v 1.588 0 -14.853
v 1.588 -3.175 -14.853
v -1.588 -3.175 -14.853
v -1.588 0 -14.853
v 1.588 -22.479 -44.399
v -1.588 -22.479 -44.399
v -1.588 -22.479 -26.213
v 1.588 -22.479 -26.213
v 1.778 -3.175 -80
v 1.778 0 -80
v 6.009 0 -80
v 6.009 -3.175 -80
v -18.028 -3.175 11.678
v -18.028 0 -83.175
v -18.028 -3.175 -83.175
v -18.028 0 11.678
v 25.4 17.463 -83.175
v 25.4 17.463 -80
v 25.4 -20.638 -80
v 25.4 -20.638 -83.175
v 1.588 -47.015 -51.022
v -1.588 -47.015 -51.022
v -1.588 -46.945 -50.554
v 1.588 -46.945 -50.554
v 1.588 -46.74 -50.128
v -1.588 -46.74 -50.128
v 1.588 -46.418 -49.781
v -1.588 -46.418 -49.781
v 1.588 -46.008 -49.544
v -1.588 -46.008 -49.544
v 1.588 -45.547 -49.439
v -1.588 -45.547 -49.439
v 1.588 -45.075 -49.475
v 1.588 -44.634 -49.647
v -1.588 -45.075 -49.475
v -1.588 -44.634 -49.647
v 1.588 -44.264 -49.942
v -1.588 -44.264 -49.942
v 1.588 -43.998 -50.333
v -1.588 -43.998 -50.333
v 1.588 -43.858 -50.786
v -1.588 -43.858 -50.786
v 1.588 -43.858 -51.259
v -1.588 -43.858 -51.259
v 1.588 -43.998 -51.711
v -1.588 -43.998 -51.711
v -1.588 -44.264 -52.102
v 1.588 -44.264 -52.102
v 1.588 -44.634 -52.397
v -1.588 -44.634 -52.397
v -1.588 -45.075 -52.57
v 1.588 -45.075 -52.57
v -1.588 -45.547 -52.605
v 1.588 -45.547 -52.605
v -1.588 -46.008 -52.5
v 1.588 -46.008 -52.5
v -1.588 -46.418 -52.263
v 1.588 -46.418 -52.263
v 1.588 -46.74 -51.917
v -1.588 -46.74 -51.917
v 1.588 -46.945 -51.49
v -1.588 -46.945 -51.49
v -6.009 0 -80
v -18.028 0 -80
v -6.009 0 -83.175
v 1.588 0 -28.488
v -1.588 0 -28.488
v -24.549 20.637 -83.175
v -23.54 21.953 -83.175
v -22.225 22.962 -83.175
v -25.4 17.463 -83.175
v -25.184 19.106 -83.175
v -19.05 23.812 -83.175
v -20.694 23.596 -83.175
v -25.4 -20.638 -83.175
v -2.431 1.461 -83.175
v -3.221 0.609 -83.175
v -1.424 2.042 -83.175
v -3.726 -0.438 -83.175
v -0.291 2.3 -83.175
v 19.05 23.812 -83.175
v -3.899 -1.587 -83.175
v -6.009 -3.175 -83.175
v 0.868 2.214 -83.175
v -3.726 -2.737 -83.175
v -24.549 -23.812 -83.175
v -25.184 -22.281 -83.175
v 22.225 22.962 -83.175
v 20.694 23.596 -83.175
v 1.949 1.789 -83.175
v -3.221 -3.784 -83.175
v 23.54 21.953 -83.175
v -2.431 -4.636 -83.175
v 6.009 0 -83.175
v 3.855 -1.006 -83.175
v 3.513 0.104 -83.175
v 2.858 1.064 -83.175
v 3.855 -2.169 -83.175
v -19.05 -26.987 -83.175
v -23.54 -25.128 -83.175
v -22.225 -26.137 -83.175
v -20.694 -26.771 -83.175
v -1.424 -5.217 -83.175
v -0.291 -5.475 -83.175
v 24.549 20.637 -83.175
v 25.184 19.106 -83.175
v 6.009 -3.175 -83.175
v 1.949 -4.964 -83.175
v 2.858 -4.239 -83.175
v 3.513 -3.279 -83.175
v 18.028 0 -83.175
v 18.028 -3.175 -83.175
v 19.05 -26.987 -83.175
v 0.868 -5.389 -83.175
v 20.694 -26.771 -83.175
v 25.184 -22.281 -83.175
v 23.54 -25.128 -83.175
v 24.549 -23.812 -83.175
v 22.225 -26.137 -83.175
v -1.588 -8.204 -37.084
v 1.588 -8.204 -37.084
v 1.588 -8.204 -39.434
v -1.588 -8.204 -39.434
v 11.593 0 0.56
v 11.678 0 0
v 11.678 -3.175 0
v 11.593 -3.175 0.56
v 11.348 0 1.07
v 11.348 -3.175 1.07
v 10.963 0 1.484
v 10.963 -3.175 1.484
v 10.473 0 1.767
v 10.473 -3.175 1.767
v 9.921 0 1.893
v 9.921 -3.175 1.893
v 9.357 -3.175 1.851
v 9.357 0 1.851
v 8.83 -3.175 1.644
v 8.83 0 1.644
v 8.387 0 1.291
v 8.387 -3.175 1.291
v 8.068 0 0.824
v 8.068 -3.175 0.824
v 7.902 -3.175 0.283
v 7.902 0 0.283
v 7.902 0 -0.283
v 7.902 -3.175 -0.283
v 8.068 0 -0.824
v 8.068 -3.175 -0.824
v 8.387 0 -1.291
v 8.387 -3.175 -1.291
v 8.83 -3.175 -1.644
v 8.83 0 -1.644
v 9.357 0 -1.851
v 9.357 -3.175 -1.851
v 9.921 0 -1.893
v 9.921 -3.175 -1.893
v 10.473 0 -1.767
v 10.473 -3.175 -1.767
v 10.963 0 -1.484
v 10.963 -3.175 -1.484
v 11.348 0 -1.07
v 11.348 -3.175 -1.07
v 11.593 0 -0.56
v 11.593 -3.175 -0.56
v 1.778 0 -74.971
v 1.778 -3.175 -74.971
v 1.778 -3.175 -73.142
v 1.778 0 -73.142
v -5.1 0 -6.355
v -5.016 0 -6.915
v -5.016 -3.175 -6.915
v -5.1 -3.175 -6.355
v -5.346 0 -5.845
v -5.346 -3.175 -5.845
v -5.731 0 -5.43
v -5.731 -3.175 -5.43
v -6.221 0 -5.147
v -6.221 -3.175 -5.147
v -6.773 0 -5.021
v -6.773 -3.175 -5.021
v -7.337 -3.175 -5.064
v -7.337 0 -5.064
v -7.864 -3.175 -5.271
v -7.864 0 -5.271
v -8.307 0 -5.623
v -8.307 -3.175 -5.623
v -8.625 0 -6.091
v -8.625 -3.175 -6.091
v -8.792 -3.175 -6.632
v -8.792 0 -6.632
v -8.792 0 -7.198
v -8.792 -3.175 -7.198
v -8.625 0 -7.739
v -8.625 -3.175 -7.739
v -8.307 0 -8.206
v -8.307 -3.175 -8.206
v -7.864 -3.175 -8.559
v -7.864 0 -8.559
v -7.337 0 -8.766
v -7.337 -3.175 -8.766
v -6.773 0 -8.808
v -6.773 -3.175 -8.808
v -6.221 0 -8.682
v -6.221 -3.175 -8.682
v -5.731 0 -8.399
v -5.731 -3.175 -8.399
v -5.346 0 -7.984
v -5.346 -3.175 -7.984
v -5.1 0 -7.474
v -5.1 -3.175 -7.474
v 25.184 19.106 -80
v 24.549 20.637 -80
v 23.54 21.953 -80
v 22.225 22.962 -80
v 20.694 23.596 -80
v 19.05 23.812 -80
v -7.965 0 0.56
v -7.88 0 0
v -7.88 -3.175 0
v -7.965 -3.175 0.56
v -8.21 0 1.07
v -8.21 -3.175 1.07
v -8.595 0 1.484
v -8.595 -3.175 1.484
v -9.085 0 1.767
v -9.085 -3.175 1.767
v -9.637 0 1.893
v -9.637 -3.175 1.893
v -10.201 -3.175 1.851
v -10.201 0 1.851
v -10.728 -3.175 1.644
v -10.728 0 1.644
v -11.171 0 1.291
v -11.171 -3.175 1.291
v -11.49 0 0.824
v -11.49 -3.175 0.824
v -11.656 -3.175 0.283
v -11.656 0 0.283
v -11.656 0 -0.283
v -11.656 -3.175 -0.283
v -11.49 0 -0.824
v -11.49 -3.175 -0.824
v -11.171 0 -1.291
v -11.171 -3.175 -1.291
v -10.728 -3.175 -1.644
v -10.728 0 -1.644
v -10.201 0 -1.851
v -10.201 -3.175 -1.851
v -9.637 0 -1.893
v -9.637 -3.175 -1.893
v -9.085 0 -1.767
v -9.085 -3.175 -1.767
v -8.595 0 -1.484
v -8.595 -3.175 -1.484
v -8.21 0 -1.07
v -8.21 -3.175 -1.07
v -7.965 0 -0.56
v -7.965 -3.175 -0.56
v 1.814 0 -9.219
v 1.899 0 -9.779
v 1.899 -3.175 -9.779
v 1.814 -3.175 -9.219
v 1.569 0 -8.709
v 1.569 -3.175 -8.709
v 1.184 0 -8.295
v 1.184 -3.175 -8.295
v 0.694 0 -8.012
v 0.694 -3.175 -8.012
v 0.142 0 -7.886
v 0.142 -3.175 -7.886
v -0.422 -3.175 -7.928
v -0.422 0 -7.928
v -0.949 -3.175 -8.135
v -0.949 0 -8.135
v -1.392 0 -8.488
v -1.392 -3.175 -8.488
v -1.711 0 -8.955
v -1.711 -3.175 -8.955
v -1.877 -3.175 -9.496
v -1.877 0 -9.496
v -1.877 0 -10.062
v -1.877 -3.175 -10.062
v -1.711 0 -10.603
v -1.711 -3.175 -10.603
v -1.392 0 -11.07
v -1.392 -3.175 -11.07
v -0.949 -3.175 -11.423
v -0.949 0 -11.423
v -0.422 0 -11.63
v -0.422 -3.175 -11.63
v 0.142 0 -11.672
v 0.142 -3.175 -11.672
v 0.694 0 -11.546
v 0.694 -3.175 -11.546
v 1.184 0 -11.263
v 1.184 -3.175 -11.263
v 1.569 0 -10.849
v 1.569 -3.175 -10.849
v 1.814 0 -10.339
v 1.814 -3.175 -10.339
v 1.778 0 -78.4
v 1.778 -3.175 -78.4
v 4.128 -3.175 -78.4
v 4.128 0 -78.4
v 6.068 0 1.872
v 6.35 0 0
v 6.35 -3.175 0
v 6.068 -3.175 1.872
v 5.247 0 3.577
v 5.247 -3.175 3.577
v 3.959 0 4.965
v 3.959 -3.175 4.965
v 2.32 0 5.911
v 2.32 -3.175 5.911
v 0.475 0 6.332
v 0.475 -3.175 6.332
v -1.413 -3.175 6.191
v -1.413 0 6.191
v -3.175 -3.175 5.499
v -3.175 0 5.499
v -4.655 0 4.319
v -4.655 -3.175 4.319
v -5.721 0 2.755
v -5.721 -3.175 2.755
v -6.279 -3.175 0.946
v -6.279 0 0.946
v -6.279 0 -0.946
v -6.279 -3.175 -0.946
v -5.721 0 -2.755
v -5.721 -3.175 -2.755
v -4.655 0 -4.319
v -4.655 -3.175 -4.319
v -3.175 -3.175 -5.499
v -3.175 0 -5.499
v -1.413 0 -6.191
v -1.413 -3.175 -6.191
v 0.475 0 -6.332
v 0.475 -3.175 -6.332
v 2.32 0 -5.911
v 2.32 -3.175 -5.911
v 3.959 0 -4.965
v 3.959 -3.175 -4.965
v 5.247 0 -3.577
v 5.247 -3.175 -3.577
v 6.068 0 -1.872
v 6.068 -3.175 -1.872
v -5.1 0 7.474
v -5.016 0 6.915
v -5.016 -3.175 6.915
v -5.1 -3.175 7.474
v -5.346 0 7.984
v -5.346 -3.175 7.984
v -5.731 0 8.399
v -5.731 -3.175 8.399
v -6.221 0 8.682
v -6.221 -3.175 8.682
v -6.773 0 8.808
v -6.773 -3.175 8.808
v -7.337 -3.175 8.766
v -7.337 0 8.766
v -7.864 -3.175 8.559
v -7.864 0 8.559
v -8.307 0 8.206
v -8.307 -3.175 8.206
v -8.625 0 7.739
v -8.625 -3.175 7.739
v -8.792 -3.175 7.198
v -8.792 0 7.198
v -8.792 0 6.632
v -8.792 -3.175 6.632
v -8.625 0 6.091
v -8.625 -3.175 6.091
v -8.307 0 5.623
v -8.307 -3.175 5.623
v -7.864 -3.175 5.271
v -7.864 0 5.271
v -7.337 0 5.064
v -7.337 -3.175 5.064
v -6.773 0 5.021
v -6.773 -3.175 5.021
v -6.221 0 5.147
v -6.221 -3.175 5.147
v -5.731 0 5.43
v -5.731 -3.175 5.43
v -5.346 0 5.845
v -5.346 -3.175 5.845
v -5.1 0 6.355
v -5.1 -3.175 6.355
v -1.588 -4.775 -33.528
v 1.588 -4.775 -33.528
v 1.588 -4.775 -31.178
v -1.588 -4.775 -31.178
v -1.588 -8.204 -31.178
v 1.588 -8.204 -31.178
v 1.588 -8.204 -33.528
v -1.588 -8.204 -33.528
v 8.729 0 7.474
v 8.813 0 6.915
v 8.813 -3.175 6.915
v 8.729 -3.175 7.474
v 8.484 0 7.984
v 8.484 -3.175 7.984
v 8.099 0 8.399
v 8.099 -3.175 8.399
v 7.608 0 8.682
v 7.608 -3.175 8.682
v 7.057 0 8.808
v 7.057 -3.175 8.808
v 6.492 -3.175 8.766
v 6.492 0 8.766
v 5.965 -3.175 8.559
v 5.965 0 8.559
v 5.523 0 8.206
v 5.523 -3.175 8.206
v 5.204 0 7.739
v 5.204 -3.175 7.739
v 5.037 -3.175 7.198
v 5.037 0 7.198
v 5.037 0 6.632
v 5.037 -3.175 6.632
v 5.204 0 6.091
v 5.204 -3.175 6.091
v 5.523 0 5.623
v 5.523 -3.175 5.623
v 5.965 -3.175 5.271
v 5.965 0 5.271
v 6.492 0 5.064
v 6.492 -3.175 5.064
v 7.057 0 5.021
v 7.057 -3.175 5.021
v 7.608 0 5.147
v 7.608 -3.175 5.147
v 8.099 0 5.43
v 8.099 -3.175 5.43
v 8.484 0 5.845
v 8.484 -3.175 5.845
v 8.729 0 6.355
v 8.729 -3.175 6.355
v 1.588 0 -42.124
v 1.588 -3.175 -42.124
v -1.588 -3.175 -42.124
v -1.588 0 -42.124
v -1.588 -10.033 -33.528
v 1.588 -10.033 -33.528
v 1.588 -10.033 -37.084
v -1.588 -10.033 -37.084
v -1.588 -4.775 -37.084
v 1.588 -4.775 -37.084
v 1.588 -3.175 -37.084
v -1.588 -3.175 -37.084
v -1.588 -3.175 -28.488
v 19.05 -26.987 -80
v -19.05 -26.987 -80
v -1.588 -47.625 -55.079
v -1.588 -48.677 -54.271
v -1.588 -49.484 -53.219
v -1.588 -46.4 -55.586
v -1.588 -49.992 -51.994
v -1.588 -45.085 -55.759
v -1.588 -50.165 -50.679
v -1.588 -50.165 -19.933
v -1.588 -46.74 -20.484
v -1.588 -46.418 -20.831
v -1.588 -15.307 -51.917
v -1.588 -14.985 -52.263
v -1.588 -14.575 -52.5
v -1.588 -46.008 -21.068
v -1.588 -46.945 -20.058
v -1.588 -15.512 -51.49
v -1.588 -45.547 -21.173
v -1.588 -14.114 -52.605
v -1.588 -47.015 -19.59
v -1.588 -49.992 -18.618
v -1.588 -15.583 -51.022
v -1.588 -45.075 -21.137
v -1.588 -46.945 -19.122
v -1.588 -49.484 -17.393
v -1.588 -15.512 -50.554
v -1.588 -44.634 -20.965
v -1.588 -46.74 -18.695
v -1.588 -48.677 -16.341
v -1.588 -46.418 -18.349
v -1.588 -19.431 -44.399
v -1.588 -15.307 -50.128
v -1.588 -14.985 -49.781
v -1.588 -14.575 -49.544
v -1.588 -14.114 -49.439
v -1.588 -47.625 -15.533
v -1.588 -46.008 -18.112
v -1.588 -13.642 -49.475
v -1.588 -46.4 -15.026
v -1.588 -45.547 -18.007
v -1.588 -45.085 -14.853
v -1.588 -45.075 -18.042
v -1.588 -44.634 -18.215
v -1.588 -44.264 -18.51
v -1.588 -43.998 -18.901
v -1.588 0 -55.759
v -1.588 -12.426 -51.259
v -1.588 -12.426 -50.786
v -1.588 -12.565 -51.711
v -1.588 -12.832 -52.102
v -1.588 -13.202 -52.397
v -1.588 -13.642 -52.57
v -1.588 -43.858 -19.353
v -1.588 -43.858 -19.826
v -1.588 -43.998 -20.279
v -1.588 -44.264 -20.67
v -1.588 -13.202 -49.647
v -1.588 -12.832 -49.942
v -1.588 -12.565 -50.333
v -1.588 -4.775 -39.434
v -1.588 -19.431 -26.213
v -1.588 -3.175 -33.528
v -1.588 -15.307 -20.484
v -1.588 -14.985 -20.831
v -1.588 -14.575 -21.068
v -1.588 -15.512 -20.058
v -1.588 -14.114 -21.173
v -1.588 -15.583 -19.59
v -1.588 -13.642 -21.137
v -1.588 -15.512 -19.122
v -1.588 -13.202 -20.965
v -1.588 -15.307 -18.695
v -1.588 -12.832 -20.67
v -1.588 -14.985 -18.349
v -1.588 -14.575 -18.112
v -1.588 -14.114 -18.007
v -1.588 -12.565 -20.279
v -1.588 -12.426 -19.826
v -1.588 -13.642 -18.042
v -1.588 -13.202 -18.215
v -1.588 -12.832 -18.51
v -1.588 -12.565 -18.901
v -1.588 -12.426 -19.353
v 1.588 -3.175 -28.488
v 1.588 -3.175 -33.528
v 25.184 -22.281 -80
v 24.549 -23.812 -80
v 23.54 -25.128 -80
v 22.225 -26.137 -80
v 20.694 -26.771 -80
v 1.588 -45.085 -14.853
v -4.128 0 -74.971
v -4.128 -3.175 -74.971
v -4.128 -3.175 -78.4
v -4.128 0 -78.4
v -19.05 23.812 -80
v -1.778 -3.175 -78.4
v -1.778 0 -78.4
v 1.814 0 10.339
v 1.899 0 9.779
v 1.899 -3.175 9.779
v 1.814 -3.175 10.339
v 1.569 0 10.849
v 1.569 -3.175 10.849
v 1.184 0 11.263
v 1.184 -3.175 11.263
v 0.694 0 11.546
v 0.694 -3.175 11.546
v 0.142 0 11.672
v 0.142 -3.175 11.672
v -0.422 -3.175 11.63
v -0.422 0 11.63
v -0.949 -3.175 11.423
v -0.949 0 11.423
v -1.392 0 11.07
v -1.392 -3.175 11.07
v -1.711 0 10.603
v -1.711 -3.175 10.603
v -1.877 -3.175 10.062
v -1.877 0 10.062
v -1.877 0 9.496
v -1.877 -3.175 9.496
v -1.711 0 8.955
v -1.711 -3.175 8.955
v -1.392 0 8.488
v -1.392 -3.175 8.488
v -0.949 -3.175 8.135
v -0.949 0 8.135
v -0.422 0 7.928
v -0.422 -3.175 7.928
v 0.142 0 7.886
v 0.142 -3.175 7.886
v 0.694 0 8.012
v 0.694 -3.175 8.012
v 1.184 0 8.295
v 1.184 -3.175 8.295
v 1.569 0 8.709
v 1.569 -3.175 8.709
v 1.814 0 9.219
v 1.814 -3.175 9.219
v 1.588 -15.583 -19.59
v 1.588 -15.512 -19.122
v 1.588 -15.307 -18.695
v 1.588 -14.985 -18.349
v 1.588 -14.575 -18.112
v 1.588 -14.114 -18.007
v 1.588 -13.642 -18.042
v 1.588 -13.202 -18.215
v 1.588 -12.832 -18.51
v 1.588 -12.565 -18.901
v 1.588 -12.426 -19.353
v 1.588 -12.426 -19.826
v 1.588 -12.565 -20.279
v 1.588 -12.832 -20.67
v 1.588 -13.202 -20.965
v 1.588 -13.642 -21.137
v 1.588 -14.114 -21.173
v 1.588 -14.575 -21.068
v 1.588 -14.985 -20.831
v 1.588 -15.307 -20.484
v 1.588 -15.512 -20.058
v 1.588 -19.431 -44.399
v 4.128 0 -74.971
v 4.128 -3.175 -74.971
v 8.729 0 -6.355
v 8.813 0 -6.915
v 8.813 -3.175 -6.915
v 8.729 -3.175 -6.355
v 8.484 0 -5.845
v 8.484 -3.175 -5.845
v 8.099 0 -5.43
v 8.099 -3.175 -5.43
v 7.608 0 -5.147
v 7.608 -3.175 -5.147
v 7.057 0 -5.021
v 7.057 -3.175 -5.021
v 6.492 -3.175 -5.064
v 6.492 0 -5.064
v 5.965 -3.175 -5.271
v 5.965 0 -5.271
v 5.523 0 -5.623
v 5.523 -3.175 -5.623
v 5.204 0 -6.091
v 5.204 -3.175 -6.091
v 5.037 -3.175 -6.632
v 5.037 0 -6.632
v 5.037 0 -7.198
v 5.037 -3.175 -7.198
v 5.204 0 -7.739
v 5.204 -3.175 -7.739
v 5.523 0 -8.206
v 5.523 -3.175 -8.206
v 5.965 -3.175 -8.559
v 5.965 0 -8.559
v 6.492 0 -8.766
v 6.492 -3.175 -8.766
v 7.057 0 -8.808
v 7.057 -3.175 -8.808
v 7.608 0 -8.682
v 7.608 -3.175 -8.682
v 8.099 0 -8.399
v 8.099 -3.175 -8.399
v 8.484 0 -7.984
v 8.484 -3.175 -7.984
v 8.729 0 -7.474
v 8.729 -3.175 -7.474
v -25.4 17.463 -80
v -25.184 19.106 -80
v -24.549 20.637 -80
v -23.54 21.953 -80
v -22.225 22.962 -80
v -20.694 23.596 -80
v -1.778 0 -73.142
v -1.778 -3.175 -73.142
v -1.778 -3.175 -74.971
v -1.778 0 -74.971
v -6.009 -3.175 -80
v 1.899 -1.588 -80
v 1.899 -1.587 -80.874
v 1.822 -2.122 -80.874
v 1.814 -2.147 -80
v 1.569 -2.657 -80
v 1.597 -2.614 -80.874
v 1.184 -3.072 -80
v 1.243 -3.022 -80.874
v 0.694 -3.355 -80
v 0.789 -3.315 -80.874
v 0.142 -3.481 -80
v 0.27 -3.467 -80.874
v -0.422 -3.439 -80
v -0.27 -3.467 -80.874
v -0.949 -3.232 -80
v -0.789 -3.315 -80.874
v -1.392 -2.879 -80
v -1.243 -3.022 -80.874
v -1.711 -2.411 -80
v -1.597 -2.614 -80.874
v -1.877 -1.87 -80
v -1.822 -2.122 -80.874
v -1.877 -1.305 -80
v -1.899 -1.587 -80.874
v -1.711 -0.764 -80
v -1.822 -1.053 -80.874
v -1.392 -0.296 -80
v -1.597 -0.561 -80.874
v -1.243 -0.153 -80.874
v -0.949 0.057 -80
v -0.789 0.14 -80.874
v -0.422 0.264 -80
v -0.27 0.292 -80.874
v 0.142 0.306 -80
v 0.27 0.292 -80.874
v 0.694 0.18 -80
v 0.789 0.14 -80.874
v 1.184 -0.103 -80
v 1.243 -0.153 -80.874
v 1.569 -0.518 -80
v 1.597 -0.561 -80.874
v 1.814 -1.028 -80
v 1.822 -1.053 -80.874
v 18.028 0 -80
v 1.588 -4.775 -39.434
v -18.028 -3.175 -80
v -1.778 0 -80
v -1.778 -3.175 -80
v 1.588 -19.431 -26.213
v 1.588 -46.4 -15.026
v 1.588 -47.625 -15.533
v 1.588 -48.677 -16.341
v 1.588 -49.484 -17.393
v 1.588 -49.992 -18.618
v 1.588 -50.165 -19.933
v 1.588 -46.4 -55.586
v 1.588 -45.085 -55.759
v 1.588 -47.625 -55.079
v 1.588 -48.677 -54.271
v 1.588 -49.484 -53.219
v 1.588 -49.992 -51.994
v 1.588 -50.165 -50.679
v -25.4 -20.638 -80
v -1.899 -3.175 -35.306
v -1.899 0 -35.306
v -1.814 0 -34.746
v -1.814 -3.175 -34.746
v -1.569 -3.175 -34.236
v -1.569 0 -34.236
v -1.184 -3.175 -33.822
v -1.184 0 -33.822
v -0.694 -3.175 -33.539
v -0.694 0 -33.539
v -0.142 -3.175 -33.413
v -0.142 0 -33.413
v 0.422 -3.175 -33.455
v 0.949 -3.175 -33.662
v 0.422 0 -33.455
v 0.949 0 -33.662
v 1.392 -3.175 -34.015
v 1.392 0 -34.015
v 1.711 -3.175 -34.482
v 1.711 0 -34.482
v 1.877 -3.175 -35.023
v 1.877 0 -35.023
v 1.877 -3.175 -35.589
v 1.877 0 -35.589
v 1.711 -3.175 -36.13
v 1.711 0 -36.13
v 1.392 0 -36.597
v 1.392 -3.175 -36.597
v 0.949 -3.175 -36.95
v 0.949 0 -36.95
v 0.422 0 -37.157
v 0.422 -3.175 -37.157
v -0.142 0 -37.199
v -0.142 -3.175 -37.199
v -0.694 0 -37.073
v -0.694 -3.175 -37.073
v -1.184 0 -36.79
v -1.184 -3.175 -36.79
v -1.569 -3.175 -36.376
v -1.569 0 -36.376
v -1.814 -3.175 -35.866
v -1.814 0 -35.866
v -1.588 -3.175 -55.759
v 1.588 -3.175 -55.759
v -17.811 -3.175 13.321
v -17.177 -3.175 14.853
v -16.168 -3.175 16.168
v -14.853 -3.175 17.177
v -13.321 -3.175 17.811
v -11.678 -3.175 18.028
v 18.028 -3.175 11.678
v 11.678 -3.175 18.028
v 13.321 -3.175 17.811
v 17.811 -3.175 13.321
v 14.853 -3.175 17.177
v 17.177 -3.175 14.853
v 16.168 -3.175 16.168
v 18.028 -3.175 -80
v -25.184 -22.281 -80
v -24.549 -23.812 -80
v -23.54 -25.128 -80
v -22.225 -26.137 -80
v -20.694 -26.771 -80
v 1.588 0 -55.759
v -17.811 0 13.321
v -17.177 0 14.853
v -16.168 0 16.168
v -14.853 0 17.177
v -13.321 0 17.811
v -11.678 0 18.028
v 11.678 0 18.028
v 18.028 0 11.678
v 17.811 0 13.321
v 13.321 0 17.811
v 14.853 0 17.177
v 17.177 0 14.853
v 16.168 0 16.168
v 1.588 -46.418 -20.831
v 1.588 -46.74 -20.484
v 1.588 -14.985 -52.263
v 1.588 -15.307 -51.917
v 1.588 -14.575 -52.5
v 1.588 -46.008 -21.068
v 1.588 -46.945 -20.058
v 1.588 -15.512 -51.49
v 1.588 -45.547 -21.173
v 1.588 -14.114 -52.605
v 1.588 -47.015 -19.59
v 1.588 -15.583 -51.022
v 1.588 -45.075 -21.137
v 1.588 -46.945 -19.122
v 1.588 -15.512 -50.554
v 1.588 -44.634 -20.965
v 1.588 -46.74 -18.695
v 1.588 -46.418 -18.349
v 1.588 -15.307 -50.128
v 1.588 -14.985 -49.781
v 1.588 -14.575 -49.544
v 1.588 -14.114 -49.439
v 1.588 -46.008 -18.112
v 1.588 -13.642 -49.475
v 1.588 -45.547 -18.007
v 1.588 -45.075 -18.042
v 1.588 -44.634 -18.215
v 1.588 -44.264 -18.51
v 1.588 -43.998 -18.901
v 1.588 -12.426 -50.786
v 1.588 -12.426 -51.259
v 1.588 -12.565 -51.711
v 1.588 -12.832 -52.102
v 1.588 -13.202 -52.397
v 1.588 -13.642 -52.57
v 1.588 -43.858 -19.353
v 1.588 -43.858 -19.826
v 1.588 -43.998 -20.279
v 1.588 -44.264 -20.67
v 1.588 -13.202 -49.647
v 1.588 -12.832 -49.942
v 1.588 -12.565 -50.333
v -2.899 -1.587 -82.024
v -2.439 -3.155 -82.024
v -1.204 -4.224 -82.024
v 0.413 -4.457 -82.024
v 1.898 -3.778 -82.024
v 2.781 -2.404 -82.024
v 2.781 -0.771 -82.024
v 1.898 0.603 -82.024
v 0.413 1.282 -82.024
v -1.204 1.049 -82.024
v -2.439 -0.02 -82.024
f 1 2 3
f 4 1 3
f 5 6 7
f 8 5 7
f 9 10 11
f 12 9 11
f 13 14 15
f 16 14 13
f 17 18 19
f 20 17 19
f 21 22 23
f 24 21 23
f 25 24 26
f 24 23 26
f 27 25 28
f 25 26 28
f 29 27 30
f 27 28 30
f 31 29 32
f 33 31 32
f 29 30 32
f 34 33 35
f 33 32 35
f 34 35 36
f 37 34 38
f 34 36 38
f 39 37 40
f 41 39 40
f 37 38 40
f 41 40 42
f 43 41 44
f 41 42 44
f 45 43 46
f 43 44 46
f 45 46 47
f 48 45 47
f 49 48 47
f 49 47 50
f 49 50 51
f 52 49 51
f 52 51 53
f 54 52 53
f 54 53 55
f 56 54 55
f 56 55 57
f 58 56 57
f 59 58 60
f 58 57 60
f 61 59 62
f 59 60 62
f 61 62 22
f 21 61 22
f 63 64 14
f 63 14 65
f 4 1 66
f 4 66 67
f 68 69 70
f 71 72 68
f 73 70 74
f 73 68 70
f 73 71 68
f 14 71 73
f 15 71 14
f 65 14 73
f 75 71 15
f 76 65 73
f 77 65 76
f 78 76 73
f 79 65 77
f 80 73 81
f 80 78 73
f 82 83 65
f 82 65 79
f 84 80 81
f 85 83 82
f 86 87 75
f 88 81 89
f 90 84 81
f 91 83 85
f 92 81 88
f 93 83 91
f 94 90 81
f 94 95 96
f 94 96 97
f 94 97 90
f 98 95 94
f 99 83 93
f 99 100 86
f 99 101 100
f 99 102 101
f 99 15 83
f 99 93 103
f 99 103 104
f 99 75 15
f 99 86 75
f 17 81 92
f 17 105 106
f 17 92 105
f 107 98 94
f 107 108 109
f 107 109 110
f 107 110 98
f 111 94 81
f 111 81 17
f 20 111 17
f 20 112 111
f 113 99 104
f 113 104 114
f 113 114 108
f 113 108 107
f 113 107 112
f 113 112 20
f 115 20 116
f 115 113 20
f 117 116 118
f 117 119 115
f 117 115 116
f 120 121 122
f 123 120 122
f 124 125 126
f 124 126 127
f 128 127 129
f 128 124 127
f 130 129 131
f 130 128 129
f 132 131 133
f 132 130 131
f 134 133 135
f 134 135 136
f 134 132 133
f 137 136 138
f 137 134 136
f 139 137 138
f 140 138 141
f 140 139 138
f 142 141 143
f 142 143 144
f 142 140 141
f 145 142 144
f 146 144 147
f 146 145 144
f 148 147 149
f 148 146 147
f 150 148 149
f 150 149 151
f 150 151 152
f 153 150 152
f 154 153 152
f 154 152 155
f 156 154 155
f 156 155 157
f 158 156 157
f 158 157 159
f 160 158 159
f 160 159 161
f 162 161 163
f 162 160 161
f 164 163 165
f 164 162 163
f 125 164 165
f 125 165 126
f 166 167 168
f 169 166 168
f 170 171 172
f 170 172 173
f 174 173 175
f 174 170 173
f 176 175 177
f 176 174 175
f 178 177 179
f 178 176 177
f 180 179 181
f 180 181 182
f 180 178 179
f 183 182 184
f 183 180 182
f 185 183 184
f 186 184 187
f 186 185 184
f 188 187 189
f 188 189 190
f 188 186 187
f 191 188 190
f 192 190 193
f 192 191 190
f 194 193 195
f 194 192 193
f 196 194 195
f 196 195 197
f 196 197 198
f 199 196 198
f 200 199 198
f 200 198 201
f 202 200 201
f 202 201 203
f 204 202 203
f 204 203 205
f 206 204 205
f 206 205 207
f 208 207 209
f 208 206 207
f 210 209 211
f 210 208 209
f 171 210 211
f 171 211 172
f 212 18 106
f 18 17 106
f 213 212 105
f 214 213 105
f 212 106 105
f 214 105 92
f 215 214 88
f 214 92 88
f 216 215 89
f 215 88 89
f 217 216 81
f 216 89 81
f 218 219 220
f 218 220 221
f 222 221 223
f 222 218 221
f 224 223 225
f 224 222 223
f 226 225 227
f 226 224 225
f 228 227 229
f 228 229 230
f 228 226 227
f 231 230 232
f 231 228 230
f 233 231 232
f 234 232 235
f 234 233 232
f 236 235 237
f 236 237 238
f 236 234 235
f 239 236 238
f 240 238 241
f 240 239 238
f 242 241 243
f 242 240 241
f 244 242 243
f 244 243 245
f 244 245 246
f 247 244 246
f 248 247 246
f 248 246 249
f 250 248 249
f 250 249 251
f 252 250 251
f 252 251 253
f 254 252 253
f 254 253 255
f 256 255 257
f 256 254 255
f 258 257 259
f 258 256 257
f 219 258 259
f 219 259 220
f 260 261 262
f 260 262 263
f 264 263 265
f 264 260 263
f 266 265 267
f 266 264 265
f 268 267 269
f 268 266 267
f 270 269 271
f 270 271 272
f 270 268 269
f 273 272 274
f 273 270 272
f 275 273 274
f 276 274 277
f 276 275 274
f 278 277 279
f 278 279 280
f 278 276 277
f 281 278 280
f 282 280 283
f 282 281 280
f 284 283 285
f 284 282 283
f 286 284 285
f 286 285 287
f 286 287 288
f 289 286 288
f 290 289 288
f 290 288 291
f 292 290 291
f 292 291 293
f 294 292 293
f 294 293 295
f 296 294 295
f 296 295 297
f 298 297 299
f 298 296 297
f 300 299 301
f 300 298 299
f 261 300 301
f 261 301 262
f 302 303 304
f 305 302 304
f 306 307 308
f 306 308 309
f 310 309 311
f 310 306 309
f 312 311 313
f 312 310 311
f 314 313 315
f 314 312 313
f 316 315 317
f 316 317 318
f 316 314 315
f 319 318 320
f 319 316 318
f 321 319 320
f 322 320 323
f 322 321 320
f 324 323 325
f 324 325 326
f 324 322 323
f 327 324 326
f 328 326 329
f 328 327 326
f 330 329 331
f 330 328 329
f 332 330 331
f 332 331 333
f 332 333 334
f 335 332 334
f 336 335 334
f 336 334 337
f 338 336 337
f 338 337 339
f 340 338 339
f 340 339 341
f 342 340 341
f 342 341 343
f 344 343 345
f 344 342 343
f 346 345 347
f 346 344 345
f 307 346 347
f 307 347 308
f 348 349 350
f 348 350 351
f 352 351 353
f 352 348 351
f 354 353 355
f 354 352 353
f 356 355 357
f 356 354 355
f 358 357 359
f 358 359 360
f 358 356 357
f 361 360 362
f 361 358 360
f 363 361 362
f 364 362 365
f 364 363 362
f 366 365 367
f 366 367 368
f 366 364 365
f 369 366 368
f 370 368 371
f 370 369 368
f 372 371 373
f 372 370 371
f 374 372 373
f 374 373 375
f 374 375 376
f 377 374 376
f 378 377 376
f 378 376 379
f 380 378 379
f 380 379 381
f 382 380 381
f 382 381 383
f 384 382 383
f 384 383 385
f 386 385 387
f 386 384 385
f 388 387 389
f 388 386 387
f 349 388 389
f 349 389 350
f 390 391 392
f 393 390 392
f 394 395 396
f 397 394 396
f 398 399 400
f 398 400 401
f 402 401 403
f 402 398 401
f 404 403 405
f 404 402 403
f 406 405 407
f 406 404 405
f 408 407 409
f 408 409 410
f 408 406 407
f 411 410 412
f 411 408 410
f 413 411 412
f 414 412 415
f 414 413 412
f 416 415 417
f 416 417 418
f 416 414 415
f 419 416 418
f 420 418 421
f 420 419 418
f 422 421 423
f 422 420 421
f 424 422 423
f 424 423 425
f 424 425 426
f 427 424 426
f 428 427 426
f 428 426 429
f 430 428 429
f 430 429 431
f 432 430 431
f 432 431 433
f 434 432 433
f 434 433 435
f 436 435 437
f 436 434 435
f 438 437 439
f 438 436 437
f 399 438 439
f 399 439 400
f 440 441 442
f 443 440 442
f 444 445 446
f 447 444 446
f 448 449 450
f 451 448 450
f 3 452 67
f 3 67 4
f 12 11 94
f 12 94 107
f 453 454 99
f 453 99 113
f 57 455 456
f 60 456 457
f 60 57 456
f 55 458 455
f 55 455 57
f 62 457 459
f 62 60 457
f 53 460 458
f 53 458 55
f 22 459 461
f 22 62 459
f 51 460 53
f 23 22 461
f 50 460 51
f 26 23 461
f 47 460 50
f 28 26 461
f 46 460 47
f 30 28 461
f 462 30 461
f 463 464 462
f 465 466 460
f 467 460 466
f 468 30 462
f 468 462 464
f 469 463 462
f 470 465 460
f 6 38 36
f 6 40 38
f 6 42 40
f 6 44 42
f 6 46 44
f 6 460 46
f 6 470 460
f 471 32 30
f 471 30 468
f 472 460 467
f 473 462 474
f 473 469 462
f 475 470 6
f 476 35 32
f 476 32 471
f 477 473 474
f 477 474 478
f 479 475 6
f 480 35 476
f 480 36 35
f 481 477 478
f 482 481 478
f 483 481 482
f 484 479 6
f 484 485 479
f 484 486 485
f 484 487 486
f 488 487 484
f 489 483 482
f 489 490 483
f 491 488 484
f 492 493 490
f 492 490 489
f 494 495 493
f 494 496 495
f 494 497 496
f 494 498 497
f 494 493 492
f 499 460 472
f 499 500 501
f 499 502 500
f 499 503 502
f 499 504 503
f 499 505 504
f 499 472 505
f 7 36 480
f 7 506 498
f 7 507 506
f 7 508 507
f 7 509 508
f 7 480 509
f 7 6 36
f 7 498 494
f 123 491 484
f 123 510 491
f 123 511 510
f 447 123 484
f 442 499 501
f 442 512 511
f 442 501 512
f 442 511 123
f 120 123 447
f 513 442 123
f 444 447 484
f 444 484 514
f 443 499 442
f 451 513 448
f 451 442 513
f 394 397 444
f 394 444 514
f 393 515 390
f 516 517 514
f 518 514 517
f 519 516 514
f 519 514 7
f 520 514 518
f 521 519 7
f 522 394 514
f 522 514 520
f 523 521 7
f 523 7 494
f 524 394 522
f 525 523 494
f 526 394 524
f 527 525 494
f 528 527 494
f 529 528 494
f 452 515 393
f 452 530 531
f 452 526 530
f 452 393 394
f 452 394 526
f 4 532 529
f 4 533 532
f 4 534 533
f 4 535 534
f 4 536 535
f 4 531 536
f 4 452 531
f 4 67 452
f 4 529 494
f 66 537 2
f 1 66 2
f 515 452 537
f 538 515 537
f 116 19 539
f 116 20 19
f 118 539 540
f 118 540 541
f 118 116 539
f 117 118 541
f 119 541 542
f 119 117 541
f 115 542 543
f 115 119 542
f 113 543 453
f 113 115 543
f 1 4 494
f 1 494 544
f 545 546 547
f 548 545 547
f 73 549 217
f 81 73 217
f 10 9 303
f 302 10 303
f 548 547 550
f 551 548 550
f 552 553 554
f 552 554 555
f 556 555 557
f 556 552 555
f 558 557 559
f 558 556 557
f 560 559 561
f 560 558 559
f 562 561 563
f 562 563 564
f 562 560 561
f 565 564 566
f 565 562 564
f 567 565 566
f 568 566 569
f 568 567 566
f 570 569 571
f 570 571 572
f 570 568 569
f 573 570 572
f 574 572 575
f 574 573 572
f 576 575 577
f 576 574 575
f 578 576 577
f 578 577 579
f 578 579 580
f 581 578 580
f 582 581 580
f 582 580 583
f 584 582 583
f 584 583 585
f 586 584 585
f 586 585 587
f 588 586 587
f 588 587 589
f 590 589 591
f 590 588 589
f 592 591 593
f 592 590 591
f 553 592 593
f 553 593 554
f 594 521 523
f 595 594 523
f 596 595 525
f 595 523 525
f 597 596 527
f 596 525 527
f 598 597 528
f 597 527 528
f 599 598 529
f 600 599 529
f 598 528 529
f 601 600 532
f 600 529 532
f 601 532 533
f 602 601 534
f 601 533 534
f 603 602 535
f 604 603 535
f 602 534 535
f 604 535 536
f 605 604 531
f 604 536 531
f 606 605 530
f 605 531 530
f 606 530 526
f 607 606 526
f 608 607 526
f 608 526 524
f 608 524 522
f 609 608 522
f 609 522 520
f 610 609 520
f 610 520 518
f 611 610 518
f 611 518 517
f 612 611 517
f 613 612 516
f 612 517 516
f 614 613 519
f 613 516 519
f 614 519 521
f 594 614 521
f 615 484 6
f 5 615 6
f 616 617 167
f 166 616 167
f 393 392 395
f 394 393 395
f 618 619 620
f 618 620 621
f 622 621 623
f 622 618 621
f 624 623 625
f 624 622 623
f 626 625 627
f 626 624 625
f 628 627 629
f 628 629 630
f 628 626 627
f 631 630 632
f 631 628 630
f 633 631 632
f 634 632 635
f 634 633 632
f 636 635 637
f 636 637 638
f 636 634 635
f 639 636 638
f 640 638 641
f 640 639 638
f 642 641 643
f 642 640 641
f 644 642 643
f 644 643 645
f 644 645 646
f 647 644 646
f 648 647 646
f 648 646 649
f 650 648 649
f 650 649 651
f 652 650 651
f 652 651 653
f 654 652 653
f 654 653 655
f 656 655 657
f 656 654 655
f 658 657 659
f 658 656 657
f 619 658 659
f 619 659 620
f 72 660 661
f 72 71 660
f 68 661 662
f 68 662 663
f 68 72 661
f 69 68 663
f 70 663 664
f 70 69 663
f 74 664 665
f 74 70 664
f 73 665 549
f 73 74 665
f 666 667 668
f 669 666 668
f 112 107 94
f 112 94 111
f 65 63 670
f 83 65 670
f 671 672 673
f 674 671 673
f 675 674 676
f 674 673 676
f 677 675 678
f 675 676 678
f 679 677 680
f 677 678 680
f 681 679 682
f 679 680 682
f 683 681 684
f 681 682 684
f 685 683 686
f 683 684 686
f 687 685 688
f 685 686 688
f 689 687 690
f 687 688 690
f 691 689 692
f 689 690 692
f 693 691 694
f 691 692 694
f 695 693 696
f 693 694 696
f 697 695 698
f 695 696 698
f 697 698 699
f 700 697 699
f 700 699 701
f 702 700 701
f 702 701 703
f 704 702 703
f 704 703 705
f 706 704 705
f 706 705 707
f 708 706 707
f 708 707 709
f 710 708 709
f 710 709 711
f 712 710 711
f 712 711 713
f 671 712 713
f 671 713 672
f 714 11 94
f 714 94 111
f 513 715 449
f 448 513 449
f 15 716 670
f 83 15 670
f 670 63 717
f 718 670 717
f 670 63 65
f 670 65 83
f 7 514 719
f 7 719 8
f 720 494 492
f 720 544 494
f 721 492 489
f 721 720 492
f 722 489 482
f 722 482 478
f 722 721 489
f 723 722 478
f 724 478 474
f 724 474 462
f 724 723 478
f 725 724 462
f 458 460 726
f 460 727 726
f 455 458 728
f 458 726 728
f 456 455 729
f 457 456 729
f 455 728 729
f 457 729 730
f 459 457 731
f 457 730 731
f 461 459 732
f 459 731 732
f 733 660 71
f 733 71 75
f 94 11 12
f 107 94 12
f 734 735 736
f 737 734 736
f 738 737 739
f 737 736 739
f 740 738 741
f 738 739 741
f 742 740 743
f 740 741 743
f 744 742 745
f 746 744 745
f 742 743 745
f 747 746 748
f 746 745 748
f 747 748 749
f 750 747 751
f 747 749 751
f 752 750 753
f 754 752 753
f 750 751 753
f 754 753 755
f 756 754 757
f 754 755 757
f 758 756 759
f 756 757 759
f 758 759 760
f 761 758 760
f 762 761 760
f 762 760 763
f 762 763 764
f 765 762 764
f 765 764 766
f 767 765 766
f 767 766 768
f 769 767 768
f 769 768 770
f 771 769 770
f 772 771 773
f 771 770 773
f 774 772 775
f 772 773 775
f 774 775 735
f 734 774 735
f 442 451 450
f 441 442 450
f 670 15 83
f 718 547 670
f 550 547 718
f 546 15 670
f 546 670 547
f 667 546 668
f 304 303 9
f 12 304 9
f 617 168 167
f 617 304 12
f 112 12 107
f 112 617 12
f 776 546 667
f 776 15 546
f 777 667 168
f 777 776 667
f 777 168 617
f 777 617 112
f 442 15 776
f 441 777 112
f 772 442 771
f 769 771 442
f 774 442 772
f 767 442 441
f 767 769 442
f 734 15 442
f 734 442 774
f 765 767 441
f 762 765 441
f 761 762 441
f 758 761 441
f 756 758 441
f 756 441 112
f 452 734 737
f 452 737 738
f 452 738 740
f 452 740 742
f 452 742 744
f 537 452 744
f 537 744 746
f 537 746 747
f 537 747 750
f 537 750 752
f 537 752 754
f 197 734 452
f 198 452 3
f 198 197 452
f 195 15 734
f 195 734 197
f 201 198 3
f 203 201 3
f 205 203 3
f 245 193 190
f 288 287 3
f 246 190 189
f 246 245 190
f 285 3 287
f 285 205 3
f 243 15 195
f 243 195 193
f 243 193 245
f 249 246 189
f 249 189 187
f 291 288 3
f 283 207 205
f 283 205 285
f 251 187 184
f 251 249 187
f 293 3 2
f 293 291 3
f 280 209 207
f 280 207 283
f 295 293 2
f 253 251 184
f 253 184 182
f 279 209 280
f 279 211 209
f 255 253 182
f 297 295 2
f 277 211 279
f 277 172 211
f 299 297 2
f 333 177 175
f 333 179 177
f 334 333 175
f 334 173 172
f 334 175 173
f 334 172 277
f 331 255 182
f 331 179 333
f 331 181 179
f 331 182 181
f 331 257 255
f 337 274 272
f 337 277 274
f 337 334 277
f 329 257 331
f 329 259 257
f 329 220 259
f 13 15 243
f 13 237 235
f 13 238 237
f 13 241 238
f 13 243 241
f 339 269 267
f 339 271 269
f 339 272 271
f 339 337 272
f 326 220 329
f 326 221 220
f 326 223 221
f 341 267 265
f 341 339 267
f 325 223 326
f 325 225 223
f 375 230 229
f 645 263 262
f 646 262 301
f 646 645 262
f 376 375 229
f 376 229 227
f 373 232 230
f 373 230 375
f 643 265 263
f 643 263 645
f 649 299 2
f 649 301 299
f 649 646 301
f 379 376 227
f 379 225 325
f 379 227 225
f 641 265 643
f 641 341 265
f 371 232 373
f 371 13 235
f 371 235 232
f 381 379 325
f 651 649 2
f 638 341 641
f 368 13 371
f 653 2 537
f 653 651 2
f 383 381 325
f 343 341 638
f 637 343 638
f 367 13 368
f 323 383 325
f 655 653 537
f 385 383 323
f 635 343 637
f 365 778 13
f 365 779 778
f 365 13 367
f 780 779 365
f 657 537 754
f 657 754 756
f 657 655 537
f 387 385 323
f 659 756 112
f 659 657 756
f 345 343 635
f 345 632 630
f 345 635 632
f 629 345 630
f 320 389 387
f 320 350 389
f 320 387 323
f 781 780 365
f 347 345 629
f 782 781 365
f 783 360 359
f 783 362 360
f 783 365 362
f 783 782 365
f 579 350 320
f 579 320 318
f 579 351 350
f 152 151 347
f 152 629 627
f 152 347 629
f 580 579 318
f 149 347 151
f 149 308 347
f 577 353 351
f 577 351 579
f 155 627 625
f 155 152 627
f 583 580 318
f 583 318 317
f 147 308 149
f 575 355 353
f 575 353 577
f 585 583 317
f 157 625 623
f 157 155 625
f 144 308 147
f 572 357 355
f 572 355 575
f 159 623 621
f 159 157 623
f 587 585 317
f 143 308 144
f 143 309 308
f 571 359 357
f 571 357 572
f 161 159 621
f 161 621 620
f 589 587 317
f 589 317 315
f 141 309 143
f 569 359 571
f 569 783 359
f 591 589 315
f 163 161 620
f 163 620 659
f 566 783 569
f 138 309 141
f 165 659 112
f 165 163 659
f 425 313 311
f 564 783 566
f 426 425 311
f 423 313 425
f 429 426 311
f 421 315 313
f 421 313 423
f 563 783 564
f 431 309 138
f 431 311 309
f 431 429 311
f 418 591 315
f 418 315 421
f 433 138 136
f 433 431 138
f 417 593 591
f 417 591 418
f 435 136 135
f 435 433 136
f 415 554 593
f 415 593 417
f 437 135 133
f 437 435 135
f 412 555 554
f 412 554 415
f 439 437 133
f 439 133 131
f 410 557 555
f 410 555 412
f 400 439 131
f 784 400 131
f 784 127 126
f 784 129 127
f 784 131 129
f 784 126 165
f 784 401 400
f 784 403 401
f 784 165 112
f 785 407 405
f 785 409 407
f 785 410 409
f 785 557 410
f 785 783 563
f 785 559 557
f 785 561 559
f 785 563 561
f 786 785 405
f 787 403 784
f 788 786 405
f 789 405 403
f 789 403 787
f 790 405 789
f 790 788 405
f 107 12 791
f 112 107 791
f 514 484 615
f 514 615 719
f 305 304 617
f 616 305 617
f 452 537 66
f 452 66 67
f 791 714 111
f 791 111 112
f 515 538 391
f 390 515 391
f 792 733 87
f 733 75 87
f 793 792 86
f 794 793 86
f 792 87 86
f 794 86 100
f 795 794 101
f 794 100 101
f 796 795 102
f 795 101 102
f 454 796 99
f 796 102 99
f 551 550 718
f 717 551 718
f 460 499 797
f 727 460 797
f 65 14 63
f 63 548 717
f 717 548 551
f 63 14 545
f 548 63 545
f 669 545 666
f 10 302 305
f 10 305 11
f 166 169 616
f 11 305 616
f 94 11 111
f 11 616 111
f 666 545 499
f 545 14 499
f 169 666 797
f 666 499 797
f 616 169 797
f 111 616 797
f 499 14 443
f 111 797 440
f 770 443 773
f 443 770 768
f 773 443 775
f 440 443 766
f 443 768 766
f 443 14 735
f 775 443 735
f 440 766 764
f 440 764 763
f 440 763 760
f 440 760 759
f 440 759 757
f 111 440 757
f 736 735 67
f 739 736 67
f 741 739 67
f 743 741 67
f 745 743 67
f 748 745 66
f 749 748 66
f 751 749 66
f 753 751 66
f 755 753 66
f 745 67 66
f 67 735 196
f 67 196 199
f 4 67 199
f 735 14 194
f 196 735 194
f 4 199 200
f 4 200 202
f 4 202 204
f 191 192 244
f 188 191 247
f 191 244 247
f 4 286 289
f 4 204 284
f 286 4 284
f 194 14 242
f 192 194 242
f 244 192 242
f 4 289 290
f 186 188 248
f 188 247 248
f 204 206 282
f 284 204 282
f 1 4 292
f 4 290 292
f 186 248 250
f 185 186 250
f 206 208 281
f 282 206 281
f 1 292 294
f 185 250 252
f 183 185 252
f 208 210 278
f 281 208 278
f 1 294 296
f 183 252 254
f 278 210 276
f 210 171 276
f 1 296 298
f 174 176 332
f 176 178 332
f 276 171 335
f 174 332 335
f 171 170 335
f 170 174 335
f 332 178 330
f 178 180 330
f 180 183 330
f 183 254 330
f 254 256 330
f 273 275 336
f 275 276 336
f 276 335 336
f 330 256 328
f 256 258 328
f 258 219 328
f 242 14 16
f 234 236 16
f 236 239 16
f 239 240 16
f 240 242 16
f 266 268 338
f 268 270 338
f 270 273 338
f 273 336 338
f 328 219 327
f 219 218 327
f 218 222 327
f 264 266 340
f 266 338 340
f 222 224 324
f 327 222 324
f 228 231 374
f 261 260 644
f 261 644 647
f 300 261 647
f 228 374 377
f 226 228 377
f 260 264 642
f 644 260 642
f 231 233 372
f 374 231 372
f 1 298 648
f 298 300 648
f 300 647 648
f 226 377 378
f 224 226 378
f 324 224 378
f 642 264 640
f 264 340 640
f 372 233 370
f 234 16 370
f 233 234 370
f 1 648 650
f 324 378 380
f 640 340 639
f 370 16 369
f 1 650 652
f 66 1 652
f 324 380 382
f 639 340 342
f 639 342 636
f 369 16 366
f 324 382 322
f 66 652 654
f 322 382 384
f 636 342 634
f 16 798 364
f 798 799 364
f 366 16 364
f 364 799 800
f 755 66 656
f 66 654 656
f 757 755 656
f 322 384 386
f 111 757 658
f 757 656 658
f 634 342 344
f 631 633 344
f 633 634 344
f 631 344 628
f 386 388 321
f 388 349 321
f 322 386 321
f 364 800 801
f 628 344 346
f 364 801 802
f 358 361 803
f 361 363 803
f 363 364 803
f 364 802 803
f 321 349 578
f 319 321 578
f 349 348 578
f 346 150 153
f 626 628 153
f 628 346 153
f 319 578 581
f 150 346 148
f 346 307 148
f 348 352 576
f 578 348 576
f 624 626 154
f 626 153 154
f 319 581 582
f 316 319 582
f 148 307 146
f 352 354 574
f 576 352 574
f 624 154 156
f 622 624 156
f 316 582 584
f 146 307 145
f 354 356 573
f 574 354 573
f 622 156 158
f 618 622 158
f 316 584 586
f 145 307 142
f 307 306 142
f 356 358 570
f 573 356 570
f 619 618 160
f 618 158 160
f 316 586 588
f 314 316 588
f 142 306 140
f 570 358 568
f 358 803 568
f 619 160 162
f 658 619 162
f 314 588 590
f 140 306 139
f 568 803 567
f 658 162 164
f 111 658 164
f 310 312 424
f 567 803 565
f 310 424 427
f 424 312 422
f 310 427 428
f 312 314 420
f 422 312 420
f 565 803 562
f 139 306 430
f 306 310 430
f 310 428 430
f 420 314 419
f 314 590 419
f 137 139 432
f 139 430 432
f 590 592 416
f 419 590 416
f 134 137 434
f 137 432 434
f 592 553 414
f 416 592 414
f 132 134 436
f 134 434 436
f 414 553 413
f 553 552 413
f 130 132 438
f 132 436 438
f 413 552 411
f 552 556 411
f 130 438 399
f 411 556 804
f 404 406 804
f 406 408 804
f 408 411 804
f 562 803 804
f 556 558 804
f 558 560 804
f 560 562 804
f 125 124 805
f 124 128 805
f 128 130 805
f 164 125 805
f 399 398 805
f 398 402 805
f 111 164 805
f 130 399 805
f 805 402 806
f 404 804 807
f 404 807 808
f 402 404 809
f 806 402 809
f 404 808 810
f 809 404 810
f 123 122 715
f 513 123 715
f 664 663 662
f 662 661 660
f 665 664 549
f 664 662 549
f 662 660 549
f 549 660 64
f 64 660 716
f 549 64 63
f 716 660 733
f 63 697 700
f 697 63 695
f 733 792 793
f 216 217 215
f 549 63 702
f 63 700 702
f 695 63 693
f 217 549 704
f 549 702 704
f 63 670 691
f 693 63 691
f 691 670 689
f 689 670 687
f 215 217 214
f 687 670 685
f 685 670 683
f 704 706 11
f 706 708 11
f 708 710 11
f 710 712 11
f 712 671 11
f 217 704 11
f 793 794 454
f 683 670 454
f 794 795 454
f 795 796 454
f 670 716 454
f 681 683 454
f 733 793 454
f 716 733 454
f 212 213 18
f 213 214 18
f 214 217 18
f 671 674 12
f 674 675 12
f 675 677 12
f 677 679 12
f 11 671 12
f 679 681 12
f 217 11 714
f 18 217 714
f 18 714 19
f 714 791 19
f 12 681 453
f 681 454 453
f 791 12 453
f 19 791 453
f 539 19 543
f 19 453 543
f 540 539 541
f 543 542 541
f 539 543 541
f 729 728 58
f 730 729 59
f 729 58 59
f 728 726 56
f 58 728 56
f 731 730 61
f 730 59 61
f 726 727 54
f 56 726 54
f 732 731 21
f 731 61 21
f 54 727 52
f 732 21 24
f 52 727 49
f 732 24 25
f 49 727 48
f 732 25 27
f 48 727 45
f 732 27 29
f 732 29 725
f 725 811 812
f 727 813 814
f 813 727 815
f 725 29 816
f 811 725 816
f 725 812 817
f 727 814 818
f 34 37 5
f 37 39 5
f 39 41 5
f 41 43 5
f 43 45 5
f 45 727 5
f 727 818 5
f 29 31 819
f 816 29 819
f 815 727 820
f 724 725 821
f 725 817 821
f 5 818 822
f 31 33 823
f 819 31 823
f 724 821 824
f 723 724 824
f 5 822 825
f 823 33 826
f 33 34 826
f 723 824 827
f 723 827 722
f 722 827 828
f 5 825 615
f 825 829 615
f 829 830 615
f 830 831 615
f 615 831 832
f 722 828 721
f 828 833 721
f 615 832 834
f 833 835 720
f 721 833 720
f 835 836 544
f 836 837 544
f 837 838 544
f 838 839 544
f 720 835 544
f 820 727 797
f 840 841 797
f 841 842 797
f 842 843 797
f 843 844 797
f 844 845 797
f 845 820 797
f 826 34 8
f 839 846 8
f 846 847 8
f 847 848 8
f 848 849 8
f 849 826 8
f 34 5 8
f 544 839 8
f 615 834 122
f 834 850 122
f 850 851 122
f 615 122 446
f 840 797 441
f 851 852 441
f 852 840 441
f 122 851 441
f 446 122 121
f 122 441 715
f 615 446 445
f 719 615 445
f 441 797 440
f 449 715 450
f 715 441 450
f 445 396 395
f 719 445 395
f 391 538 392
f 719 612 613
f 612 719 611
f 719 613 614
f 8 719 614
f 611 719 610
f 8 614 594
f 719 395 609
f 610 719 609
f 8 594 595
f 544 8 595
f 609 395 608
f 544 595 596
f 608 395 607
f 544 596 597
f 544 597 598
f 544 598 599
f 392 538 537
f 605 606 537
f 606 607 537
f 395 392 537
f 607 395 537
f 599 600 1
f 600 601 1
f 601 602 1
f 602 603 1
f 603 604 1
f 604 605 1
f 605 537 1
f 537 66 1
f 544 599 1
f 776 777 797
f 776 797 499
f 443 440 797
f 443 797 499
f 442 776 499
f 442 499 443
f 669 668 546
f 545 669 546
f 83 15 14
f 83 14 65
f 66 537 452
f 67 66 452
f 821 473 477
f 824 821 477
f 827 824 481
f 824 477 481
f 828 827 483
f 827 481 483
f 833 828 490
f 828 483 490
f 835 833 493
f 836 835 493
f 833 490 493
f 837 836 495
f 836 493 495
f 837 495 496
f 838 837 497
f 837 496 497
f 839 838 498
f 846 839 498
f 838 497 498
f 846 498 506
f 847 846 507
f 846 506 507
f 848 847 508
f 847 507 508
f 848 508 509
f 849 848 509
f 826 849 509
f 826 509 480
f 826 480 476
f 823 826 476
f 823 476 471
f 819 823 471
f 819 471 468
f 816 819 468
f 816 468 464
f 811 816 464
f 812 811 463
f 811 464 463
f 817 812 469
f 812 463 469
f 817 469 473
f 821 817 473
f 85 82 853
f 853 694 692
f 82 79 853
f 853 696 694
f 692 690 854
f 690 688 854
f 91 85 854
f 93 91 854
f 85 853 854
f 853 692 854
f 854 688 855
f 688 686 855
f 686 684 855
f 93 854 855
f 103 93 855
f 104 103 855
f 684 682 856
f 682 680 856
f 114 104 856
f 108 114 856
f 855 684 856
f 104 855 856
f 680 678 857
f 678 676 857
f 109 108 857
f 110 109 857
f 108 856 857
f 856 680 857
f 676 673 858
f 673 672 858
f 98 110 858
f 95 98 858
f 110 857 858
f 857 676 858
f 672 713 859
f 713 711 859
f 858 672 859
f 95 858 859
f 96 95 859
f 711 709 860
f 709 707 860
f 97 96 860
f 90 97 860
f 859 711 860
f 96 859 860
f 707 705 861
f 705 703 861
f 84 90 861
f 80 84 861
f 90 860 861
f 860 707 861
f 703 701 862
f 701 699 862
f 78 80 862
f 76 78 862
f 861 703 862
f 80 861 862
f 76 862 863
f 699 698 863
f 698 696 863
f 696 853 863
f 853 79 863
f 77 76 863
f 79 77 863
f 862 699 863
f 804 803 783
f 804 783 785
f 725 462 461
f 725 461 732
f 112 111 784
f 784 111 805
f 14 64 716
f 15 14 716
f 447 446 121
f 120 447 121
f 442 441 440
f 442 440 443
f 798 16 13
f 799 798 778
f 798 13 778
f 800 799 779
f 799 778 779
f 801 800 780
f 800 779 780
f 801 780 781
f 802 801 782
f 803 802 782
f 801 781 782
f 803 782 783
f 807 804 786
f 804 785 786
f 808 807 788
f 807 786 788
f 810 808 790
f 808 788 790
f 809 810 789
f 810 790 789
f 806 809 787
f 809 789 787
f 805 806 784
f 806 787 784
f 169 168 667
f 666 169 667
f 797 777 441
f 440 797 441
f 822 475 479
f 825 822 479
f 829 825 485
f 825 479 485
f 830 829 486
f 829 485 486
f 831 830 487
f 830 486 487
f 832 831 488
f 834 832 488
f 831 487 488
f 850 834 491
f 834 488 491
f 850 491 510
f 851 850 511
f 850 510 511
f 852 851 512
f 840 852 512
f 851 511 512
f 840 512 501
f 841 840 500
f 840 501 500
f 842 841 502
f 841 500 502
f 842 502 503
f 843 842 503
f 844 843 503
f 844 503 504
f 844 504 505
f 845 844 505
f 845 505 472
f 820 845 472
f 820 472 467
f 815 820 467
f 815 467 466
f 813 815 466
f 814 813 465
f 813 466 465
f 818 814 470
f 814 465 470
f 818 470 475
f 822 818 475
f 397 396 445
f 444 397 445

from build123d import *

# Parameters (mm, degrees)
F0_W            = 36.0553
F0_H            = 98.02765
F0_R            = 1.89865
F0_R_2          = 6.35
F1_DEPTH        = 3.175
F2_W            = 50.8
F2_H            = 50.8
F3_DEPTH        = 3.175
F4_W            = 12.0184333333
F4_H            = 3.175
F5_DEPTH        = 3.175
F8_R            = 1.89865
F9_DEPTH        = 3.175
F11_DEPTH       = 3.175
F12_D           = 3.7973
F12_CSINK_D     = 7.7978
F12_CSINK_ANGLE = 82
F13_R           = 6.35
F13_2_R         = 6.35
F14_W           = 3.175
F14_H           = 40.9067
F15_DEPTH       = 46.99
F16_R           = 1.5875
F16_W           = 3.048
F16_H           = 18.1864
F17_DEPTH       = 3.175
F18_W           = 3.175
F18_H           = 13.6355666667
F19_DEPTH       = 3.175
F22_R           = 1.89865
F23_DEPTH       = 3.175
F25_DEPTH       = 3.175
F26_R           = 5.08


with BuildPart() as f1:
    # F0 (on Front) → F1 (new body)
    with BuildSketch(Plane.XZ):
        with Locations((0, -30.986175)):
            Rectangle(F0_W, F0_H)
        with Locations((-6.9147972132, -6.9147972132)):
            Circle(F0_R, mode=Mode.SUBTRACT)
        with Locations((0, -9.779)):
            Circle(F0_R, mode=Mode.SUBTRACT)
        with Locations((-9.779, 0)):
            Circle(F0_R, mode=Mode.SUBTRACT)
        Circle(F0_R_2, mode=Mode.SUBTRACT)
        with Locations((-6.9147972132, 6.9147972132)):
            Circle(F0_R, mode=Mode.SUBTRACT)
        with Locations((0, 9.779)):
            Circle(F0_R, mode=Mode.SUBTRACT)
        with Locations((6.9147972132, -6.9147972132)):
            Circle(F0_R, mode=Mode.SUBTRACT)
        with Locations((6.9147972132, 6.9147972132)):
            Circle(F0_R, mode=Mode.SUBTRACT)
        with Locations((9.779, 0)):
            Circle(F0_R, mode=Mode.SUBTRACT)
    extrude(amount=F1_DEPTH)


with BuildPart() as f3:
    # F2 (on face) → F3 (new body)
    with BuildSketch(Plane(origin=(0, 0, -80), x_dir=(1, 0, 0), z_dir=(0, 0, -1))):
        with Locations((0, 1.5875)):
            Rectangle(F2_W, F2_H)
    extrude(amount=F3_DEPTH)


with BuildPart() as f5:
    # F4 (on face) → F5 (new body)
    with BuildSketch(Plane(origin=(0, 0, -80), x_dir=(1, 0, 0), z_dir=(0, 0, -1))):
        with Locations((-12.0184333333, 1.5875)):
            Rectangle(F4_W, F4_H)
    extrude(amount=F5_DEPTH)


with BuildPart() as f5b:
    # F4 (on face) → F5, piece 2 (new body)
    with BuildSketch(Plane(origin=(0, 0, -80), x_dir=(1, 0, 0), z_dir=(0, 0, -1))):
        with Locations((12.0184333333, 1.5875)):
            Rectangle(F4_W, F4_H)
    extrude(amount=F5_DEPTH)


with BuildPart() as f3_1:
    add(f3.part)

    # F6: cut F5b, F5
    add(f5b.part, mode=Mode.SUBTRACT)
    add(f5.part, mode=Mode.SUBTRACT)

    # F8 (on face) → F9 (cut, through all)
    with BuildSketch(Plane(origin=(0, 0, -83.175), x_dir=(1, 0, 0), z_dir=(0, 0, -1))):
        with Locations((0, 1.5875)):
            Circle(F8_R)
    extrude(amount=-F9_DEPTH, mode=Mode.SUBTRACT)

    # F12 (through all)
    with Locations(Plane(origin=(0, 0, -83.175), x_dir=(1, 0, 0), z_dir=(0, 0, -1))):
        with Locations((0, 1.5875)):
            CounterSinkHole(F12_D / 2, F12_CSINK_D / 2, counter_sink_angle=F12_CSINK_ANGLE)

    # F13
    f13_edges = [f3_1.edges().sort_by_distance(p)[0] for p in [
        (-25.4, -26.9875, -81.5875),
        (-25.4, 23.8125, -81.5875),
        (25.4, 23.8125, -81.5875),
        (25.4, -26.9875, -81.5875),
    ]]
    fillet(f13_edges, radius=F13_R)


with BuildPart() as f5_1:
    add(f5.part)

    # F7: union F5b, F1
    add(f5b.part)
    add(f1.part)

    # F10 (on face) → F11 (cut, through all)
    with BuildSketch(Plane.XZ.offset(3.175)):
        Polygon((1.778, -73.142), (0, -73.142), (-1.778, -73.142), (-1.778, -74.9708), (-4.1275, -74.9708), (-4.1275, -78.3998), (-1.778, -78.3998), (-1.778, -80), (0, -80), (1.778, -80), (1.778, -78.3998), (4.1275, -78.3998), (4.1275, -74.9708), (1.778, -74.9708), align=None)
    extrude(amount=-F11_DEPTH, mode=Mode.SUBTRACT)

    # F13#2
    f13_2_edges = [f5_1.edges().sort_by_distance(p)[0] for p in [
        (18.02765, -1.5875, 18.02765),
        (-18.02765, -1.5875, 18.02765),
    ]]
    fillet(f13_2_edges, radius=F13_2_R)


with BuildPart() as f15:
    # F14 (on face) → F15 (new body)
    with BuildSketch(Plane.XZ.offset(3.175)):
        with Locations((0, -35.306)):
            Rectangle(F14_W, F14_H)
    extrude(amount=F15_DEPTH)

    # F16 (on face) → F17 (cut, through all)
    with BuildSketch(Plane(origin=(-1.5875, 0, 0), x_dir=(0, -1, 0), z_dir=(-1, 0, 0))):
        with Locations((13.9954, -19.58975)):
            Circle(F16_R)
        with Locations((13.9954, -51.02225)):
            Circle(F16_R)
        with Locations((45.4279, -51.02225)):
            Circle(F16_R)
        with Locations((45.4279, -19.58975)):
            Circle(F16_R)
        with Locations((20.955, -35.306)):
            Rectangle(F16_W, F16_H)
    extrude(amount=-F17_DEPTH, mode=Mode.SUBTRACT)


with BuildPart() as f19:
    # F18 (on face) → F19 (new body)
    with BuildSketch(Plane(origin=(0, -3.175, 0), x_dir=(-1, 0, 0), z_dir=(0, 1, 0))):
        with Locations((0, -21.6704333333)):
            Rectangle(F18_W, F18_H)
    extrude(amount=F19_DEPTH)


with BuildPart() as f19b:
    # F18 (on face) → F19, piece 2 (new body)
    with BuildSketch(Plane(origin=(0, -3.175, 0), x_dir=(-1, 0, 0), z_dir=(0, 1, 0))):
        with Locations((0, -48.9415666667)):
            Rectangle(F18_W, F18_H)
    extrude(amount=F19_DEPTH)


with BuildPart() as f5_2:
    add(f5_1.part)

    # F20: cut F19b, F19
    add(f19b.part, mode=Mode.SUBTRACT)
    add(f19.part, mode=Mode.SUBTRACT)

    # F22 (on face) → F23 (cut, through all)
    with BuildSketch(Plane(origin=(0, 0, 0), x_dir=(-1, 0, 0), z_dir=(0, 1, 0))):
        with Locations((0, -35.306)):
            Circle(F22_R)
    extrude(amount=-F23_DEPTH, mode=Mode.SUBTRACT)


with BuildPart() as f19b_1:
    add(f19b.part)

    # F21: union F19, F15
    add(f19.part)
    add(f15.part)

    # F24 (on face) → F25 (cut, through all)
    with BuildSketch(Plane.YZ.offset(1.5875)):
        Polygon((-10.033, -33.528), (-10.033, -35.306), (-10.033, -37.084), (-8.2042, -37.084), (-8.2042, -39.4335), (-4.7752, -39.4335), (-4.7752, -37.084), (-3.175, -37.084), (-3.175, -35.306), (-3.175, -33.528), (-4.7752, -33.528), (-4.7752, -31.1785), (-8.2042, -31.1785), (-8.2042, -33.528), align=None)
    extrude(amount=-F25_DEPTH, mode=Mode.SUBTRACT)

    # F26
    f26_edges = [f19b_1.edges().sort_by_distance(p)[0] for p in [
        (0, -50.165, -55.75935),
        (0, -50.165, -14.85265),
    ]]
    fillet(f26_edges, radius=F26_R)


solid = Compound([f3_1.part, f5_2.part, f19b_1.part])
